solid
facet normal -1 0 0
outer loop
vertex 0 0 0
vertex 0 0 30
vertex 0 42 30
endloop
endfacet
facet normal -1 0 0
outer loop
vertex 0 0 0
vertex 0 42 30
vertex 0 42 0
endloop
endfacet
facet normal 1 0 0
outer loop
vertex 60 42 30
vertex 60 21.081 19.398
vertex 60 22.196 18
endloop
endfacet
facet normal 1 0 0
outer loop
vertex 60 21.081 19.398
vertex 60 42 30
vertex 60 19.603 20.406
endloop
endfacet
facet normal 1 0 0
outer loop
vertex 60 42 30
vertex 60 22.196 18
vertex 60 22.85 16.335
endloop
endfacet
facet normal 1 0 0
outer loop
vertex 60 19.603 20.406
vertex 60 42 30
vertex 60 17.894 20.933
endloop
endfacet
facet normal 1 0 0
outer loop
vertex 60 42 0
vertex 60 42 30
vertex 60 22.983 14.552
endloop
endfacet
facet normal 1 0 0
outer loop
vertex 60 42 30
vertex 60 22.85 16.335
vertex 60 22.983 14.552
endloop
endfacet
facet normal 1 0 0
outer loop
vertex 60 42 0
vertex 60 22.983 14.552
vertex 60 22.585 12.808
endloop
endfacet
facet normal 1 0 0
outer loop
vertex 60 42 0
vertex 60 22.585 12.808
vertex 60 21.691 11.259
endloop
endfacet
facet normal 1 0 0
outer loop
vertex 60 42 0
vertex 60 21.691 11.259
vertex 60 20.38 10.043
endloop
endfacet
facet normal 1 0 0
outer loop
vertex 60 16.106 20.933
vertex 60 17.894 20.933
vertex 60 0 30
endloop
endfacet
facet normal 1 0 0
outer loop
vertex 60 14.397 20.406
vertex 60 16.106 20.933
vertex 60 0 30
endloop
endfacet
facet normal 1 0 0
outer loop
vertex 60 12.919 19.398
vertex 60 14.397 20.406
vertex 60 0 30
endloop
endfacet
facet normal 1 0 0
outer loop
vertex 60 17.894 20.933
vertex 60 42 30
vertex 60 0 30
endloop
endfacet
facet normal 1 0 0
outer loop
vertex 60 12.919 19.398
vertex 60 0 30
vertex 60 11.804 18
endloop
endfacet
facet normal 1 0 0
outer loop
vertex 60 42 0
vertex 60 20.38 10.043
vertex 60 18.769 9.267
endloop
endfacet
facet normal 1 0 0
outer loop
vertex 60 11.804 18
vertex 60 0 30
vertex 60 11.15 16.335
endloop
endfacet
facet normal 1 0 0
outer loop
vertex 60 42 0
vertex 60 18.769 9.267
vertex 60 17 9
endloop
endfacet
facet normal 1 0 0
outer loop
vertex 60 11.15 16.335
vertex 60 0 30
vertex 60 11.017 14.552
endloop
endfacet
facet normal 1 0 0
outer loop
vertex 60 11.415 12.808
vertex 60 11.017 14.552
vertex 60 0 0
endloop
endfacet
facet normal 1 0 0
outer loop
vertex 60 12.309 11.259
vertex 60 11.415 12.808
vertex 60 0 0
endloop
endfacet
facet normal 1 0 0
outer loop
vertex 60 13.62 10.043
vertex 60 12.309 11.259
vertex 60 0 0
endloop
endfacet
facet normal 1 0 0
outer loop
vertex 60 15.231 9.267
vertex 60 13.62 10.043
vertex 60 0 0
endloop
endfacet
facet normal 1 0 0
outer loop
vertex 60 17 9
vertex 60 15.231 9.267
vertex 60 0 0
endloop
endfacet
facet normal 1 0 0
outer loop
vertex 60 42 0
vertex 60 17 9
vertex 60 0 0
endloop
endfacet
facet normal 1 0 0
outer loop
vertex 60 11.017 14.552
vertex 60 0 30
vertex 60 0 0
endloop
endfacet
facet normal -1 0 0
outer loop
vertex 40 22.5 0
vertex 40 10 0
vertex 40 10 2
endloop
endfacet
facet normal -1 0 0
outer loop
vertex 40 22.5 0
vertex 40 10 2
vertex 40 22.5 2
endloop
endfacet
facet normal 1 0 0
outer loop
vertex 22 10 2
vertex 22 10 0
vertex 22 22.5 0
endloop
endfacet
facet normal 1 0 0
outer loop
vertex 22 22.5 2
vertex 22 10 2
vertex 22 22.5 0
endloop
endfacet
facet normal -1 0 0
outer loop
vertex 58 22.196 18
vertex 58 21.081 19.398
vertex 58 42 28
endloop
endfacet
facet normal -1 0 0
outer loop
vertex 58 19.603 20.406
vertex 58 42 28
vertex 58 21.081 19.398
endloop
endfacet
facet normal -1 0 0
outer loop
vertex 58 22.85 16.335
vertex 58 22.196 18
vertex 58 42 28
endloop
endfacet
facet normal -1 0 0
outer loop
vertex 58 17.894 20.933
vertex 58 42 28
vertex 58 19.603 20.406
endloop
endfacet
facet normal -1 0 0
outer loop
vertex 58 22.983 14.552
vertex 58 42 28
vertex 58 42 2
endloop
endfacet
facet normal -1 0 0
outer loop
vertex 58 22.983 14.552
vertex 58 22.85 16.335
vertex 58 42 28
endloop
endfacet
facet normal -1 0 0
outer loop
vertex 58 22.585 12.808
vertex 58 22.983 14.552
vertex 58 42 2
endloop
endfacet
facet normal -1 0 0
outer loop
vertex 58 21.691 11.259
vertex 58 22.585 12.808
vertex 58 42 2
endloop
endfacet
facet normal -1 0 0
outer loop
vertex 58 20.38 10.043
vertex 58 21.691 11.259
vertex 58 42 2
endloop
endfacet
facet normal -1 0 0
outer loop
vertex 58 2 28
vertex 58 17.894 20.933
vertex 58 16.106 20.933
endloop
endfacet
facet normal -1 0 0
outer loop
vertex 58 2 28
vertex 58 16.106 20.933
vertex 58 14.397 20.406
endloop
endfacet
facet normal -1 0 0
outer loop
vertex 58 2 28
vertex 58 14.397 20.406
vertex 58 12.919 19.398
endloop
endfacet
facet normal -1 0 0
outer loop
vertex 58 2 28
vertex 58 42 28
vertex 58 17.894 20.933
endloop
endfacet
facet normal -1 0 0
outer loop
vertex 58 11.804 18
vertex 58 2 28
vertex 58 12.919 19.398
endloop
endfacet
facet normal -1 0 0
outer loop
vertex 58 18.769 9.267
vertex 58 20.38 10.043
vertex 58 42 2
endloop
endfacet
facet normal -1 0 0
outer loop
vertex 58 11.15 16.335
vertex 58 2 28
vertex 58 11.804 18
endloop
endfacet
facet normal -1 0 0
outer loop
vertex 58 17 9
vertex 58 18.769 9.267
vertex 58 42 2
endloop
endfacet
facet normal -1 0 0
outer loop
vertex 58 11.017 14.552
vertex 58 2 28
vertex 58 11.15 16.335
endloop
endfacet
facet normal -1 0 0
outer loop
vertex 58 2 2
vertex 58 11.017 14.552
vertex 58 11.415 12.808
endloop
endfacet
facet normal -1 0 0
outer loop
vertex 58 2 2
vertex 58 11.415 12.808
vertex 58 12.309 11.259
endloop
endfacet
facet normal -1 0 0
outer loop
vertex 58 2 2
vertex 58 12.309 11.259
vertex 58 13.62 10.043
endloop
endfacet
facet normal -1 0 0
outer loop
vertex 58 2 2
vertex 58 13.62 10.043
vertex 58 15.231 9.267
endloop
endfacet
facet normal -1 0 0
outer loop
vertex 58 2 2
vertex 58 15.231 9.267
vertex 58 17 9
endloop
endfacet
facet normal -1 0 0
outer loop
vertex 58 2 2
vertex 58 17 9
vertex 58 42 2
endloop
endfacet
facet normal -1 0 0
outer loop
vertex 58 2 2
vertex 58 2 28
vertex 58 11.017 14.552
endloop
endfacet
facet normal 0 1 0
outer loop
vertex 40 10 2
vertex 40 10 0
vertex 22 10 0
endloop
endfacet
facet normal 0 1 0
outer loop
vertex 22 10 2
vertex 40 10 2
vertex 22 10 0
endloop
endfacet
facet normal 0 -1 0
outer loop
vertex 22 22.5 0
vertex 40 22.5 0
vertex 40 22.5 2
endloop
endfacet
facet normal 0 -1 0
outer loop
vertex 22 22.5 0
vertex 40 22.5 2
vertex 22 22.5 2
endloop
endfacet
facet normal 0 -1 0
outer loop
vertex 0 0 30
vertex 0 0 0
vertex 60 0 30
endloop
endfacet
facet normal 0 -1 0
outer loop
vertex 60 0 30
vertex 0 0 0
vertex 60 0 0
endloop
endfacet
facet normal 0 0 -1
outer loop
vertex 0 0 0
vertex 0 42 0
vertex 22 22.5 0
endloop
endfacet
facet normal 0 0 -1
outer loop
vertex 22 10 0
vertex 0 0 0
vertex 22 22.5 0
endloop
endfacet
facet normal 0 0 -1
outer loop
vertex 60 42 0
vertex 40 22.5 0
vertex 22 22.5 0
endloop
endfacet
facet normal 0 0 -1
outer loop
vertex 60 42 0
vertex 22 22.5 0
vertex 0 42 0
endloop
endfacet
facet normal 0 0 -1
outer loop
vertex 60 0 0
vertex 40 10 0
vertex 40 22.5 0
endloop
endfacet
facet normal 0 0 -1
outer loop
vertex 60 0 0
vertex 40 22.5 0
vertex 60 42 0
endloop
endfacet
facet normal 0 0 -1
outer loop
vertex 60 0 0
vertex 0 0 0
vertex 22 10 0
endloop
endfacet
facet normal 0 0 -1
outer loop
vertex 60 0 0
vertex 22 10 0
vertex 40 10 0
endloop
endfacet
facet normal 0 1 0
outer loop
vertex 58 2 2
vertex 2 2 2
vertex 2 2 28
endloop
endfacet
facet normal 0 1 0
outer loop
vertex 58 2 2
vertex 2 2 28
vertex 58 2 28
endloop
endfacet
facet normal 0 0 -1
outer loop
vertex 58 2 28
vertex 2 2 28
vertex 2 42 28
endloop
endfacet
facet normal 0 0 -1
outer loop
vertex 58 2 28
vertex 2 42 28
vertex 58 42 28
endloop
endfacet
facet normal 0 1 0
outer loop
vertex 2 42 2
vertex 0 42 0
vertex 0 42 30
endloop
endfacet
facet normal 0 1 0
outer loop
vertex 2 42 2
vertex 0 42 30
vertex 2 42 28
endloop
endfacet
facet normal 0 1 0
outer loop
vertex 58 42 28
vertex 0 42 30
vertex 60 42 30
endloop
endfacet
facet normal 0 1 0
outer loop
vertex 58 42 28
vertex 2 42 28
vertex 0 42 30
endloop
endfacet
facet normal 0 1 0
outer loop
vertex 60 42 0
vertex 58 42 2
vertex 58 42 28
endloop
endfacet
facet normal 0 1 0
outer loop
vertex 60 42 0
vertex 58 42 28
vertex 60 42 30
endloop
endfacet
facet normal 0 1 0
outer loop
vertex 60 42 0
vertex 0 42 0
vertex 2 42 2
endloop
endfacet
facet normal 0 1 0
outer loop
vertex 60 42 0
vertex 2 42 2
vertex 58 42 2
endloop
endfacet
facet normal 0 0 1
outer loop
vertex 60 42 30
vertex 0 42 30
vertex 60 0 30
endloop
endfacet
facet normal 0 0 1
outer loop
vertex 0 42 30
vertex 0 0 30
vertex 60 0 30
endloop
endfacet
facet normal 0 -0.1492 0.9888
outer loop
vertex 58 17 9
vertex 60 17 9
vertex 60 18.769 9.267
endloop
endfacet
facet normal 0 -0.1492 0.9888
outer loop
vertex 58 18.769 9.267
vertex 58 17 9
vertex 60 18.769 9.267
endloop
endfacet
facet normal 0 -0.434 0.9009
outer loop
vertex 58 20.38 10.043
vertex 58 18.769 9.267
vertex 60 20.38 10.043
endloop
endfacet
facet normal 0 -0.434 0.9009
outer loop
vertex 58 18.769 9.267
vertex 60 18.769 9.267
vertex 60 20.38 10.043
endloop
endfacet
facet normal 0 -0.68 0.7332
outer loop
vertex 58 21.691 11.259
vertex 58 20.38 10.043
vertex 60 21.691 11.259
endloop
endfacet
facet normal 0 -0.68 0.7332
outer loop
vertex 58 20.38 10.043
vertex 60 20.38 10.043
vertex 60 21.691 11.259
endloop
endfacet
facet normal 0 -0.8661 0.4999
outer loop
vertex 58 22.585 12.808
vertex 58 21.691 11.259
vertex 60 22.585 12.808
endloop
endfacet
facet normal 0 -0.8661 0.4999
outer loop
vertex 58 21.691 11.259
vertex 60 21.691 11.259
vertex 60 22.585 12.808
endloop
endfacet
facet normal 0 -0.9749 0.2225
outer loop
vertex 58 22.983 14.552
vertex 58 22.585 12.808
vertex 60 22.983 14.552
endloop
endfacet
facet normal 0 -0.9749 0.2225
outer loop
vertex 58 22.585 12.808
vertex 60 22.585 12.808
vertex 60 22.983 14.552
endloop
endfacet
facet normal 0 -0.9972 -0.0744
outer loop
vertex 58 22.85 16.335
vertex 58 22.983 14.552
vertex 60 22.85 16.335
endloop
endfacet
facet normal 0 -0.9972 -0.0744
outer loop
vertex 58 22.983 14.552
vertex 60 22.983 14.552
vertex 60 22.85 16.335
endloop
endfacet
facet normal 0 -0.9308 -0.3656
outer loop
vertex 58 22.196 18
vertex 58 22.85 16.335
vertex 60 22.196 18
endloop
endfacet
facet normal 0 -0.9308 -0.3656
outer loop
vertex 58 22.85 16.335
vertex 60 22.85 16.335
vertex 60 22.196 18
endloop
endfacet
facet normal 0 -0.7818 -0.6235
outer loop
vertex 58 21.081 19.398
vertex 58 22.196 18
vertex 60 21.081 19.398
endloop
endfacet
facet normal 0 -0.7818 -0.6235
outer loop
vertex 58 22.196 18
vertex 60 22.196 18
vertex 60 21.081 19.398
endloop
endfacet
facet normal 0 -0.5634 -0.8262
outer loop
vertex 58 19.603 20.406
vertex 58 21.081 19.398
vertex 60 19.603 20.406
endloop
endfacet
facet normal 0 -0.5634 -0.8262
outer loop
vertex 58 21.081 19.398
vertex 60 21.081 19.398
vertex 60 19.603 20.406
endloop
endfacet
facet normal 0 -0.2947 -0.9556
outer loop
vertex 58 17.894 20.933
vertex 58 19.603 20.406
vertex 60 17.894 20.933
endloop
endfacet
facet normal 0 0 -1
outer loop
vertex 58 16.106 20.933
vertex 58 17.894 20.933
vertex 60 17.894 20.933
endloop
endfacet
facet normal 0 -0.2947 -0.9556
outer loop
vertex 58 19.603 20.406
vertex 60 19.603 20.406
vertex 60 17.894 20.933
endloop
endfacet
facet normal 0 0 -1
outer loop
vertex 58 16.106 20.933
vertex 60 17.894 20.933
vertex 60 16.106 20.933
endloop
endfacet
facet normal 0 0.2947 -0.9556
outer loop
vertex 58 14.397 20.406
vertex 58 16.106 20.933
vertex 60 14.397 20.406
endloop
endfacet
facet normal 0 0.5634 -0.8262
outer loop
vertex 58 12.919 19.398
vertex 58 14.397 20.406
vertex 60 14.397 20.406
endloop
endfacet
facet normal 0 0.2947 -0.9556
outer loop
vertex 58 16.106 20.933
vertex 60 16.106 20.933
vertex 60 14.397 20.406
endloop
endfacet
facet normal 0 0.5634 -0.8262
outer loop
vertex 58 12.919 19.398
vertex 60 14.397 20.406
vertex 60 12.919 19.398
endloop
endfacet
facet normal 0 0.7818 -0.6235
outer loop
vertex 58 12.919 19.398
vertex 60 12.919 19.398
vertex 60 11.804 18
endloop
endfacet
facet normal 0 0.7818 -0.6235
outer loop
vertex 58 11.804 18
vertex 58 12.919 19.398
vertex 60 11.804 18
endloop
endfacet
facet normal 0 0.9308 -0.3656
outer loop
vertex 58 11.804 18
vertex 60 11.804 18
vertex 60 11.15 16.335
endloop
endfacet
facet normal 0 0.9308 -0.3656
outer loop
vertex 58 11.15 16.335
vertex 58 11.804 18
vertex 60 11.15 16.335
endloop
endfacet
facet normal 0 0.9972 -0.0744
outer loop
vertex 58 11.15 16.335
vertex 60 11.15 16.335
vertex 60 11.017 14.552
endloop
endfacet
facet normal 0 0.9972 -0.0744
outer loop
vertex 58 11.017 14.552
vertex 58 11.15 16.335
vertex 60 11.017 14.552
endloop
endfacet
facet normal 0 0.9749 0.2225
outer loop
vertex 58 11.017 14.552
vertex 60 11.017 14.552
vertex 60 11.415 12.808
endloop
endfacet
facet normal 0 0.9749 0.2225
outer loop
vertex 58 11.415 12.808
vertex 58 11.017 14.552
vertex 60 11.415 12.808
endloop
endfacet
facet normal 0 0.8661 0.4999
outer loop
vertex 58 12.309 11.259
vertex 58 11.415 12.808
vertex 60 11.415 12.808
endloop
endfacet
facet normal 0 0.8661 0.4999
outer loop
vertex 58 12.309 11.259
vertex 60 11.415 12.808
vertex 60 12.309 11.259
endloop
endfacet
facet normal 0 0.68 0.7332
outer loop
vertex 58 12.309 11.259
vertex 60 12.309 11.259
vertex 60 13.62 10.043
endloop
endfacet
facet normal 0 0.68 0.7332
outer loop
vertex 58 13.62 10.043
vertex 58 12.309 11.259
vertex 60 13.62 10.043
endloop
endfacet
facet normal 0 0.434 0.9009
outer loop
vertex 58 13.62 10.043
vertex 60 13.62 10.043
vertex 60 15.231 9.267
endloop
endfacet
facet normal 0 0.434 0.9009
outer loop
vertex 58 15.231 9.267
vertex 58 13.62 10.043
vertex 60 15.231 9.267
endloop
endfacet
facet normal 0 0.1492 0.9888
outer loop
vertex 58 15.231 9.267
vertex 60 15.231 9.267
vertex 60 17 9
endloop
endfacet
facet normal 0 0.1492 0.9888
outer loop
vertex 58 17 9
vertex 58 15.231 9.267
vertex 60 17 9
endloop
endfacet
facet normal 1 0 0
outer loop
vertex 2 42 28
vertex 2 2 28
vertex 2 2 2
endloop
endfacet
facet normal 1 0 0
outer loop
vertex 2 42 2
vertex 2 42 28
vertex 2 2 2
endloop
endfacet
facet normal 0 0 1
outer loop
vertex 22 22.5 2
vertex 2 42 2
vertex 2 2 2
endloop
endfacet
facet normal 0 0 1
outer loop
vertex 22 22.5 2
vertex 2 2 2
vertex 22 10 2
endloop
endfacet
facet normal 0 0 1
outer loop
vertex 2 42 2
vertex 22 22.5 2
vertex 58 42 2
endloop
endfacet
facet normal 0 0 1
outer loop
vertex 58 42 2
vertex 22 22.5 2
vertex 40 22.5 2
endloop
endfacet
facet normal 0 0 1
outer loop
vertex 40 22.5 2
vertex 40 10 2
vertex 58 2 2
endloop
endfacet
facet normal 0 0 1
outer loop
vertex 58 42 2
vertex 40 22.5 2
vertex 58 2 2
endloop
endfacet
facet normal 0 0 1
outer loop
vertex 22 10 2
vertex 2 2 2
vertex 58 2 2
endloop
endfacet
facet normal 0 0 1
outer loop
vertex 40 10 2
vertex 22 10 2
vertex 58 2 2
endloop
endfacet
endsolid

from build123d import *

# Parameters (mm, degrees)
SKETCH1_W           = 60
SKETCH1_H           = 30
BOSS_EXTRUDE1_DEPTH = 2
SKETCH2_W           = 60
SKETCH2_H           = 2
BOSS_EXTRUDE2_DEPTH = 40
SKETCH3_W           = 60
SKETCH3_H           = 2
BOSS_EXTRUDE3_DEPTH = 40
SKETCH4_W           = 2
SKETCH4_H           = 26
BOSS_EXTRUDE4_DEPTH = 40
SKETCH5_W           = 2
SKETCH5_H           = 26
BOSS_EXTRUDE5_DEPTH = 40
CUT_EXTRUDE3_REACH  = 81.145
SKETCH7_R           = 6
CUT_EXTRUDE4_REACH  = 81.145
SKETCH8_W           = 18
SKETCH8_H           = 12.5


with BuildPart() as part:
    # Sketch1 → Boss-Extrude1 (new body)
    with BuildSketch(Plane(origin=(0, 0, 0), x_dir=(1, 0, 0), z_dir=(0, 1, 0))):
        with Locations((30, -15)):
            Rectangle(SKETCH1_W, SKETCH1_H)
    extrude(amount=BOSS_EXTRUDE1_DEPTH)

    # Sketch2 → Boss-Extrude2 (add)
    with BuildSketch(Plane(origin=(0, 2, 0), x_dir=(1, 0, 0), z_dir=(0, 1, 0))):
        with Locations((30, -1)):
            Rectangle(SKETCH2_W, SKETCH2_H)
    extrude(amount=BOSS_EXTRUDE2_DEPTH)

    # Sketch3 → Boss-Extrude3 (add)
    with BuildSketch(Plane(origin=(0, 2, 0), x_dir=(1, 0, 0), z_dir=(0, 1, 0))):
        with Locations((30, -29)):
            Rectangle(SKETCH3_W, SKETCH3_H)
    extrude(amount=BOSS_EXTRUDE3_DEPTH)

    # Sketch4 → Boss-Extrude4 (add)
    with BuildSketch(Plane(origin=(0, 2, 0), x_dir=(1, 0, 0), z_dir=(0, 1, 0))):
        with Locations((1, -15)):
            Rectangle(SKETCH4_W, SKETCH4_H)
    extrude(amount=BOSS_EXTRUDE4_DEPTH)

    # Sketch5 → Boss-Extrude5 (add)
    with BuildSketch(Plane(origin=(0, 2, 0), x_dir=(1, 0, 0), z_dir=(0, 1, 0))):
        with Locations((59, -15)):
            Rectangle(SKETCH5_W, SKETCH5_H)
    extrude(amount=BOSS_EXTRUDE5_DEPTH)

    # Sketch7 → Cut-Extrude3 (cut, up to next)
    with BuildSketch(Plane(origin=(60, 0, 0), x_dir=(0, 0, -1), z_dir=(1, 0, 0)), mode=Mode.PRIVATE) as cut_extrude3_sk1:
        with Locations((-15, 17)):
            Circle(SKETCH7_R)
    cut_extrude3_tool1 = extrude(cut_extrude3_sk1.sketch, amount=-CUT_EXTRUDE3_REACH, mode=Mode.PRIVATE) & part.part
    add(cut_extrude3_tool1.solids().sort_by_distance((60, 17, 15))[0], mode=Mode.SUBTRACT)

    # Sketch8 → Cut-Extrude4 (cut, up to next)
    with BuildSketch(Plane(origin=(0, 0, 0), x_dir=(-1, 0, 0), z_dir=(0, 0, -1)), mode=Mode.PRIVATE) as cut_extrude4_sk1:
        with Locations((-31, 16.25)):
            Rectangle(SKETCH8_W, SKETCH8_H)
    cut_extrude4_tool1 = extrude(cut_extrude4_sk1.sketch, amount=-CUT_EXTRUDE4_REACH, mode=Mode.PRIVATE) & part.part
    add(cut_extrude4_tool1.solids().sort_by_distance((31, 16.25, 0))[0], mode=Mode.SUBTRACT)


solid = part.part
